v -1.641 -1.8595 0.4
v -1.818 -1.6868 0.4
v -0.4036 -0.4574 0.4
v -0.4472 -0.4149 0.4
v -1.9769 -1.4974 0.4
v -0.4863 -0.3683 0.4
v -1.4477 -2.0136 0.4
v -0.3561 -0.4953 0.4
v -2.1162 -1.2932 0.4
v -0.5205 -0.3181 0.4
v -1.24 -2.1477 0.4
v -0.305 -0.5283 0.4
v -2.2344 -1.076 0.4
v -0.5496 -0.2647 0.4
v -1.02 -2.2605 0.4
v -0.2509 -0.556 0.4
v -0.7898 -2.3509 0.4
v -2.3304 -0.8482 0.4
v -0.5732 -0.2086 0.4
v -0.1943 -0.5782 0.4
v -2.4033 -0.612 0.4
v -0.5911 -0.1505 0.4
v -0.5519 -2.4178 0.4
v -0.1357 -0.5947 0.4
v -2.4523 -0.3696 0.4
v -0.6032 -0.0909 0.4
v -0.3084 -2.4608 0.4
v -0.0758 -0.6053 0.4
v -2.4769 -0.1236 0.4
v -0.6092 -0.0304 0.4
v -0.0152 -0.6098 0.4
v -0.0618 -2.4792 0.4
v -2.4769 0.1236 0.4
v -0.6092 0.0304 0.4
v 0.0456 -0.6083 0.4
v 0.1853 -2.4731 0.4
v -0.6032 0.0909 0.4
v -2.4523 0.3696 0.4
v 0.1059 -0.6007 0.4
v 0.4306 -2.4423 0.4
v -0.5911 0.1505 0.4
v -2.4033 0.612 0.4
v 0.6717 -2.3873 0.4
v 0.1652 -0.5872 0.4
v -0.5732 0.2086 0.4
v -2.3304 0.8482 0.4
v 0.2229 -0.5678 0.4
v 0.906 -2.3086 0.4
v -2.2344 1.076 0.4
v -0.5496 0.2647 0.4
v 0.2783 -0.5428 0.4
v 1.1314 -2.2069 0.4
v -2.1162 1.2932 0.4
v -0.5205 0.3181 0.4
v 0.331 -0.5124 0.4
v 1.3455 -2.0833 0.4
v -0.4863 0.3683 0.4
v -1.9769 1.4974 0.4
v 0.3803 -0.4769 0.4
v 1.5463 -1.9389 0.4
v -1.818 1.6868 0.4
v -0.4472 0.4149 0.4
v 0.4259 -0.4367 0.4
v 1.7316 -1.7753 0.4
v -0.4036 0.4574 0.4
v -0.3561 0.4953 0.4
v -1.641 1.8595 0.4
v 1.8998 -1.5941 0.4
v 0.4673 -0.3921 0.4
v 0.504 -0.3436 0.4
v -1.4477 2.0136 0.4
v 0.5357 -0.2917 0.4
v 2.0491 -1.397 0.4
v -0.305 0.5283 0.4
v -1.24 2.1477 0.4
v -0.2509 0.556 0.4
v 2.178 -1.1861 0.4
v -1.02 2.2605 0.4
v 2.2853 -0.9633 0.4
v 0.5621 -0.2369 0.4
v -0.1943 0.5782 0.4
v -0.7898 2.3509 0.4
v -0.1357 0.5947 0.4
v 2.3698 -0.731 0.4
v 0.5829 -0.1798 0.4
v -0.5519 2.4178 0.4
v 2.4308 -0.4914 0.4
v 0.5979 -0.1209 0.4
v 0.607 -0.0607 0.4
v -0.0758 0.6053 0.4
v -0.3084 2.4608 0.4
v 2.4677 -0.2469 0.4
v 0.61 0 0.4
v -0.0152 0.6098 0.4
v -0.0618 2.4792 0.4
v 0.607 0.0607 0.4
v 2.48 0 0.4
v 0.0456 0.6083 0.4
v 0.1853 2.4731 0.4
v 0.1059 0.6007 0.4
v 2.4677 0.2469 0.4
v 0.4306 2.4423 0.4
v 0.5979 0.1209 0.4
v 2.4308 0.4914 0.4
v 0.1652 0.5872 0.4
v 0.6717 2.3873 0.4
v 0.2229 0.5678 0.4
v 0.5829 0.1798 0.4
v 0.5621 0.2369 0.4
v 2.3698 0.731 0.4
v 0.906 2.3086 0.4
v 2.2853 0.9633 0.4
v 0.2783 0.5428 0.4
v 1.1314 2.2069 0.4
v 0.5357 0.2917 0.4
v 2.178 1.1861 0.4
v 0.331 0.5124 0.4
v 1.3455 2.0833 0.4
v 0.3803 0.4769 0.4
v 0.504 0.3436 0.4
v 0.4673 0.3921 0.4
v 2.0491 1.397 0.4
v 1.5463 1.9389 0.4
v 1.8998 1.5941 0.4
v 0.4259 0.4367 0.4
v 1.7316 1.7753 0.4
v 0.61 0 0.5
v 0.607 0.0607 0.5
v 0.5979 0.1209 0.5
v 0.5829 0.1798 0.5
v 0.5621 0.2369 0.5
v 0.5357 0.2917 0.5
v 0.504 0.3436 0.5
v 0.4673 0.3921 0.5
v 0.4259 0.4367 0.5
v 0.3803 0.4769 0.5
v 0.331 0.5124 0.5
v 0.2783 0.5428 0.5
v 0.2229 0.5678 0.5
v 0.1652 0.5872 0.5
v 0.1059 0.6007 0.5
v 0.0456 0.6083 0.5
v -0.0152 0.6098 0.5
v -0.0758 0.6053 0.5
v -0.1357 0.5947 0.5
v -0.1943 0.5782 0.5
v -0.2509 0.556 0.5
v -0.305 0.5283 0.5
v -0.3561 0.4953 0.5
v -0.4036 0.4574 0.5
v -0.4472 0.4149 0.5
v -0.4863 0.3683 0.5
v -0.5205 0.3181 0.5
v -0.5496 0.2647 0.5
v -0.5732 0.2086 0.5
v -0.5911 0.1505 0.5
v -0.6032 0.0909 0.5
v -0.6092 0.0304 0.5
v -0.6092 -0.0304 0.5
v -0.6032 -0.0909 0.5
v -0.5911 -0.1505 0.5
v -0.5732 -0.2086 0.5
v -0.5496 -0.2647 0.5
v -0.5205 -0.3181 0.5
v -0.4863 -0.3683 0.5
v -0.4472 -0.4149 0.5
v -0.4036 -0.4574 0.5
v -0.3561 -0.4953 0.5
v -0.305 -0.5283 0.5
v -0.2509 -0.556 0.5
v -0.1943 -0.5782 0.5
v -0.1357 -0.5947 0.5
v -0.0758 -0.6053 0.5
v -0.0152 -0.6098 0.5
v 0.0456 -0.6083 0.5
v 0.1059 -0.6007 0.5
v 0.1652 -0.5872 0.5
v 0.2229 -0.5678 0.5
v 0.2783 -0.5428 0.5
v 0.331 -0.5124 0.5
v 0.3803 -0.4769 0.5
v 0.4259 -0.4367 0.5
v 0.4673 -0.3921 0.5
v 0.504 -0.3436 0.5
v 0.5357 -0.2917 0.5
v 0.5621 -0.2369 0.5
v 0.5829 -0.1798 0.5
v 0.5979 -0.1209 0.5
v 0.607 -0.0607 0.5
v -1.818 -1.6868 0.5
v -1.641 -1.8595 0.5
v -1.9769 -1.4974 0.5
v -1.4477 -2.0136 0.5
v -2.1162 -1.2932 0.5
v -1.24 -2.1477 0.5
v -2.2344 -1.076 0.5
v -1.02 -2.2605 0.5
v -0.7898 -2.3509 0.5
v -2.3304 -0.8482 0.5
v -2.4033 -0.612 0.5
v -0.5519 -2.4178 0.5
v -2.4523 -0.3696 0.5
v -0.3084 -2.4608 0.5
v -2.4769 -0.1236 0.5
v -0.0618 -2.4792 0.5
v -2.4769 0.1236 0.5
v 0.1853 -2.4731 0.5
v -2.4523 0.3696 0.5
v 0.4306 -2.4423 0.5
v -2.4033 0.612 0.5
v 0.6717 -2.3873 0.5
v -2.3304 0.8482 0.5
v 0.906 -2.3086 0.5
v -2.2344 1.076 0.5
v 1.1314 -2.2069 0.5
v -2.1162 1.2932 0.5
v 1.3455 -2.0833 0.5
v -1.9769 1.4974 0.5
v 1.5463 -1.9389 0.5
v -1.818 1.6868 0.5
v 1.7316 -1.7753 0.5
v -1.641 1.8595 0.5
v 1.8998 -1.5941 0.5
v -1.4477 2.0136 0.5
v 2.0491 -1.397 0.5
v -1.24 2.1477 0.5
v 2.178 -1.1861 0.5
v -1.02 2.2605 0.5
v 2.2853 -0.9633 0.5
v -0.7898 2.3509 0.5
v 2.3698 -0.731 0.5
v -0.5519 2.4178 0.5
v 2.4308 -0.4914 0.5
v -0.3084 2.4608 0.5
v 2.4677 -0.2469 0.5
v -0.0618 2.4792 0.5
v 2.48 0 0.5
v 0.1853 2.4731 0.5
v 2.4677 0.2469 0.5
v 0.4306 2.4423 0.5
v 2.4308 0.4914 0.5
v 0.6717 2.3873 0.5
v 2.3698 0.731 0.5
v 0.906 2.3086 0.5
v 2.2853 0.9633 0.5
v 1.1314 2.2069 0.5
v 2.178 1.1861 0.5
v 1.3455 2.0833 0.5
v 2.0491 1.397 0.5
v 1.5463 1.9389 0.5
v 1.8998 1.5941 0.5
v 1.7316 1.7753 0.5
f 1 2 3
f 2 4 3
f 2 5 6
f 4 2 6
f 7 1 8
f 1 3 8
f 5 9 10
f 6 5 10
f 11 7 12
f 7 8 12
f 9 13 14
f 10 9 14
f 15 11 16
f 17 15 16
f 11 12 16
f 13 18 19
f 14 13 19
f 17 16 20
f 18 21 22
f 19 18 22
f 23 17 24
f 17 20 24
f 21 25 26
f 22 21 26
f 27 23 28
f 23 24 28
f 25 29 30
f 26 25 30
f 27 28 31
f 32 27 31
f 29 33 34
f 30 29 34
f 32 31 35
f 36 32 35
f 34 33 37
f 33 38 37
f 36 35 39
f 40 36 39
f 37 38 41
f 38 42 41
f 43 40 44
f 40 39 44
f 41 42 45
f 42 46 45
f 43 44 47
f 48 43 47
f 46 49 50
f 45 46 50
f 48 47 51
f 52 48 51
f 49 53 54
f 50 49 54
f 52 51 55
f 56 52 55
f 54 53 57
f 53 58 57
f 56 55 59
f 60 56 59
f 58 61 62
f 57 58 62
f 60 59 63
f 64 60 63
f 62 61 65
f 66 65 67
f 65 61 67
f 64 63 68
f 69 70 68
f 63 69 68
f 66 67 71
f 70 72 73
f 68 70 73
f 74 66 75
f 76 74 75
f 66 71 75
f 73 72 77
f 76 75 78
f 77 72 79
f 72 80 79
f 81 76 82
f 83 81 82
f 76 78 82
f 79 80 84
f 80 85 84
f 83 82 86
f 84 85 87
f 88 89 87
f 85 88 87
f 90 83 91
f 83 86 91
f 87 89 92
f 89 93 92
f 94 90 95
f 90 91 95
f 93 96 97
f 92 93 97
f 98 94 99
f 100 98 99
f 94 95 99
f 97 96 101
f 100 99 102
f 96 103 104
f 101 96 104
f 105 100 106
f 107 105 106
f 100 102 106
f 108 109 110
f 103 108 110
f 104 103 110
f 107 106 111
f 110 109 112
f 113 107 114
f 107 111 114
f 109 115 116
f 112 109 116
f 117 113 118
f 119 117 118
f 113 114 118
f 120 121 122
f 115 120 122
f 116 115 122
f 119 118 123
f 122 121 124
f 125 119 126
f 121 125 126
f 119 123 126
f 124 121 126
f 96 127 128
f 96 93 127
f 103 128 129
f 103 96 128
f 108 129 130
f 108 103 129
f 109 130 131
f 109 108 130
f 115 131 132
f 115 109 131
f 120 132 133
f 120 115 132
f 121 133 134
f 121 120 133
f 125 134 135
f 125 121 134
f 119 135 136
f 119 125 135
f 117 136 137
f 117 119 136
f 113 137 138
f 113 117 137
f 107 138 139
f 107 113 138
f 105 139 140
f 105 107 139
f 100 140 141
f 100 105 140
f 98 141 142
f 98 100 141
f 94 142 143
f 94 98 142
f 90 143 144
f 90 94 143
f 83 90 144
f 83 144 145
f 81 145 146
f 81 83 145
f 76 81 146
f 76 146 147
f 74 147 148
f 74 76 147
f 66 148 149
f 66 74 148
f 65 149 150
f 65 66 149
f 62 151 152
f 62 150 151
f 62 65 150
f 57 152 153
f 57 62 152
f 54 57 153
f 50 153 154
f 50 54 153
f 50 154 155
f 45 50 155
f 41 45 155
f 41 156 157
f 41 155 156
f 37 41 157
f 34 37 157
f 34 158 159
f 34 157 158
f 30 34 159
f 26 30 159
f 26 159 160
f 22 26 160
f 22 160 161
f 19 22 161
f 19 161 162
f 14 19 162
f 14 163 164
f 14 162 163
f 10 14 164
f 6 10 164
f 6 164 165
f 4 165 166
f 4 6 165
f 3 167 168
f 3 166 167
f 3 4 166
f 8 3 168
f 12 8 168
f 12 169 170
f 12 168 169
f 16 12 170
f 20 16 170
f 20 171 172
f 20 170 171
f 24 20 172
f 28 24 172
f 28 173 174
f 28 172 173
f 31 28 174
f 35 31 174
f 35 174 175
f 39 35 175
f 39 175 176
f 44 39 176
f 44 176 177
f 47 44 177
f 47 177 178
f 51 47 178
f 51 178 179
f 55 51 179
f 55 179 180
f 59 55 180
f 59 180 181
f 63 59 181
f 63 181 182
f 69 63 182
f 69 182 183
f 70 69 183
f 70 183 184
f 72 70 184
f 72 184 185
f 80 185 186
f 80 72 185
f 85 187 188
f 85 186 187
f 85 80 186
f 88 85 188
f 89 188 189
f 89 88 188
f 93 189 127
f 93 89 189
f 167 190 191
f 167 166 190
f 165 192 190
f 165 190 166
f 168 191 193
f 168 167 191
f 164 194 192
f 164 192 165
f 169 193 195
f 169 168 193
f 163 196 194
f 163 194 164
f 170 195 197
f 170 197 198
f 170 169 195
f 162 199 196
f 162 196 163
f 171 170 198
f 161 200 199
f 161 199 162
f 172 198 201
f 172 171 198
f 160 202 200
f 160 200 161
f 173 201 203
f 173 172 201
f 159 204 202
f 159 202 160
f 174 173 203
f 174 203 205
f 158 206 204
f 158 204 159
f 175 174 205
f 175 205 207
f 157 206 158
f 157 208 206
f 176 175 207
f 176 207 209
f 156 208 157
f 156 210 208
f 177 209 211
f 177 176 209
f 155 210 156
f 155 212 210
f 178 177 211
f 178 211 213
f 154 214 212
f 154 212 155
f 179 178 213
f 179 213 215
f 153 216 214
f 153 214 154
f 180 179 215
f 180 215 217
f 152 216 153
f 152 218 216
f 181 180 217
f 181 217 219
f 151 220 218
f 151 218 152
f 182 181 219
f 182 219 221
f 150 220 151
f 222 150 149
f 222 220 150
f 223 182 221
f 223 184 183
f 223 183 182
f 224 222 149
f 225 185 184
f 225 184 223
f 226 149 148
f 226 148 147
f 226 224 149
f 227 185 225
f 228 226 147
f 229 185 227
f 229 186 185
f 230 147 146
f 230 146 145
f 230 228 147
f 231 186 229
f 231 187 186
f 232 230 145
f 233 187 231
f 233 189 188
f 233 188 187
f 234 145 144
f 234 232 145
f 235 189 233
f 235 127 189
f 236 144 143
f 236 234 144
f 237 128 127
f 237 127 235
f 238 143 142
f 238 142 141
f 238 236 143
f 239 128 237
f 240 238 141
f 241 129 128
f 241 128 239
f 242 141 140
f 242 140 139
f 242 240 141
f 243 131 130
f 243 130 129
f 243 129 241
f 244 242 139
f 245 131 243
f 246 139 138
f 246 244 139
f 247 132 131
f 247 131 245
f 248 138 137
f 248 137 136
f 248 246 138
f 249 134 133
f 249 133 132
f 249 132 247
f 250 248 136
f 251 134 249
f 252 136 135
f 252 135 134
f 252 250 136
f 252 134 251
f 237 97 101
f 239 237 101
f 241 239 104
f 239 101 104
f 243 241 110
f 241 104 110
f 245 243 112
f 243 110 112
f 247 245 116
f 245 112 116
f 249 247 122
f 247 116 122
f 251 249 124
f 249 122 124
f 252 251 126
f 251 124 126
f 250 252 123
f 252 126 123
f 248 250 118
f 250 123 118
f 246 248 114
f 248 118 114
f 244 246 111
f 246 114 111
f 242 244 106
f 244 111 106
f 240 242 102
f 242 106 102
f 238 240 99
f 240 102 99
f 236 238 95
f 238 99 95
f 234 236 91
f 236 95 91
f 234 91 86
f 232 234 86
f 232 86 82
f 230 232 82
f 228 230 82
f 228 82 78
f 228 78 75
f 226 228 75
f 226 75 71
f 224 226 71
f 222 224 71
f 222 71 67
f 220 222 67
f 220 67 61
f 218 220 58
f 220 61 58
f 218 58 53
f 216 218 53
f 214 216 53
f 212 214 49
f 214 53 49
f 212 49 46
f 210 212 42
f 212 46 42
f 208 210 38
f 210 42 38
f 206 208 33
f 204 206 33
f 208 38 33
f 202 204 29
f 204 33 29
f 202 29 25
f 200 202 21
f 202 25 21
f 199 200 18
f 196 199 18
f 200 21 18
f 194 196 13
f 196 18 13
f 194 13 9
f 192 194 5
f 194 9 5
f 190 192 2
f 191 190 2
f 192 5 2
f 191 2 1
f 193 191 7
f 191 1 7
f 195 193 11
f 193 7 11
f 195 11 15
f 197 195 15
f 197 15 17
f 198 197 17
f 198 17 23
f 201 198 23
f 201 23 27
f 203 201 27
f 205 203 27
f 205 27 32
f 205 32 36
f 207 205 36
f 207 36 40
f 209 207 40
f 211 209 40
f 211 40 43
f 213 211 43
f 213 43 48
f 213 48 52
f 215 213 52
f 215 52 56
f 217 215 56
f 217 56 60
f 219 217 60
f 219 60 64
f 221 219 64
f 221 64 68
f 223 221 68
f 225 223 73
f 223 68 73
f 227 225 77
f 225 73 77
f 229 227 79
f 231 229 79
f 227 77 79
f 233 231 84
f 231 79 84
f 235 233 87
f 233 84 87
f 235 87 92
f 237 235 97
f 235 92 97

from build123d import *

# Parameters (mm, degrees)
CYLINDER003_R     = 0.61
CYLINDER003_DEPTH = 10
CYLINDER004_R     = 2.48
CYLINDER004_DEPTH = 0.1


with BuildPart() as cylinder003:
    # Cylinder003 → Cylinder003 (new body)
    with BuildSketch(Plane.XY):
        Circle(CYLINDER003_R)
    extrude(amount=CYLINDER003_DEPTH)


with BuildPart() as endcapfront:
    # Cylinder004 → Cylinder004 (new body)
    with BuildSketch(Plane.XY.offset(0.4)):
        Circle(CYLINDER004_R)
    extrude(amount=CYLINDER004_DEPTH)

    # Cut004: cut Cylinder003
    add(cylinder003.part, mode=Mode.SUBTRACT)


solid = endcapfront.part
